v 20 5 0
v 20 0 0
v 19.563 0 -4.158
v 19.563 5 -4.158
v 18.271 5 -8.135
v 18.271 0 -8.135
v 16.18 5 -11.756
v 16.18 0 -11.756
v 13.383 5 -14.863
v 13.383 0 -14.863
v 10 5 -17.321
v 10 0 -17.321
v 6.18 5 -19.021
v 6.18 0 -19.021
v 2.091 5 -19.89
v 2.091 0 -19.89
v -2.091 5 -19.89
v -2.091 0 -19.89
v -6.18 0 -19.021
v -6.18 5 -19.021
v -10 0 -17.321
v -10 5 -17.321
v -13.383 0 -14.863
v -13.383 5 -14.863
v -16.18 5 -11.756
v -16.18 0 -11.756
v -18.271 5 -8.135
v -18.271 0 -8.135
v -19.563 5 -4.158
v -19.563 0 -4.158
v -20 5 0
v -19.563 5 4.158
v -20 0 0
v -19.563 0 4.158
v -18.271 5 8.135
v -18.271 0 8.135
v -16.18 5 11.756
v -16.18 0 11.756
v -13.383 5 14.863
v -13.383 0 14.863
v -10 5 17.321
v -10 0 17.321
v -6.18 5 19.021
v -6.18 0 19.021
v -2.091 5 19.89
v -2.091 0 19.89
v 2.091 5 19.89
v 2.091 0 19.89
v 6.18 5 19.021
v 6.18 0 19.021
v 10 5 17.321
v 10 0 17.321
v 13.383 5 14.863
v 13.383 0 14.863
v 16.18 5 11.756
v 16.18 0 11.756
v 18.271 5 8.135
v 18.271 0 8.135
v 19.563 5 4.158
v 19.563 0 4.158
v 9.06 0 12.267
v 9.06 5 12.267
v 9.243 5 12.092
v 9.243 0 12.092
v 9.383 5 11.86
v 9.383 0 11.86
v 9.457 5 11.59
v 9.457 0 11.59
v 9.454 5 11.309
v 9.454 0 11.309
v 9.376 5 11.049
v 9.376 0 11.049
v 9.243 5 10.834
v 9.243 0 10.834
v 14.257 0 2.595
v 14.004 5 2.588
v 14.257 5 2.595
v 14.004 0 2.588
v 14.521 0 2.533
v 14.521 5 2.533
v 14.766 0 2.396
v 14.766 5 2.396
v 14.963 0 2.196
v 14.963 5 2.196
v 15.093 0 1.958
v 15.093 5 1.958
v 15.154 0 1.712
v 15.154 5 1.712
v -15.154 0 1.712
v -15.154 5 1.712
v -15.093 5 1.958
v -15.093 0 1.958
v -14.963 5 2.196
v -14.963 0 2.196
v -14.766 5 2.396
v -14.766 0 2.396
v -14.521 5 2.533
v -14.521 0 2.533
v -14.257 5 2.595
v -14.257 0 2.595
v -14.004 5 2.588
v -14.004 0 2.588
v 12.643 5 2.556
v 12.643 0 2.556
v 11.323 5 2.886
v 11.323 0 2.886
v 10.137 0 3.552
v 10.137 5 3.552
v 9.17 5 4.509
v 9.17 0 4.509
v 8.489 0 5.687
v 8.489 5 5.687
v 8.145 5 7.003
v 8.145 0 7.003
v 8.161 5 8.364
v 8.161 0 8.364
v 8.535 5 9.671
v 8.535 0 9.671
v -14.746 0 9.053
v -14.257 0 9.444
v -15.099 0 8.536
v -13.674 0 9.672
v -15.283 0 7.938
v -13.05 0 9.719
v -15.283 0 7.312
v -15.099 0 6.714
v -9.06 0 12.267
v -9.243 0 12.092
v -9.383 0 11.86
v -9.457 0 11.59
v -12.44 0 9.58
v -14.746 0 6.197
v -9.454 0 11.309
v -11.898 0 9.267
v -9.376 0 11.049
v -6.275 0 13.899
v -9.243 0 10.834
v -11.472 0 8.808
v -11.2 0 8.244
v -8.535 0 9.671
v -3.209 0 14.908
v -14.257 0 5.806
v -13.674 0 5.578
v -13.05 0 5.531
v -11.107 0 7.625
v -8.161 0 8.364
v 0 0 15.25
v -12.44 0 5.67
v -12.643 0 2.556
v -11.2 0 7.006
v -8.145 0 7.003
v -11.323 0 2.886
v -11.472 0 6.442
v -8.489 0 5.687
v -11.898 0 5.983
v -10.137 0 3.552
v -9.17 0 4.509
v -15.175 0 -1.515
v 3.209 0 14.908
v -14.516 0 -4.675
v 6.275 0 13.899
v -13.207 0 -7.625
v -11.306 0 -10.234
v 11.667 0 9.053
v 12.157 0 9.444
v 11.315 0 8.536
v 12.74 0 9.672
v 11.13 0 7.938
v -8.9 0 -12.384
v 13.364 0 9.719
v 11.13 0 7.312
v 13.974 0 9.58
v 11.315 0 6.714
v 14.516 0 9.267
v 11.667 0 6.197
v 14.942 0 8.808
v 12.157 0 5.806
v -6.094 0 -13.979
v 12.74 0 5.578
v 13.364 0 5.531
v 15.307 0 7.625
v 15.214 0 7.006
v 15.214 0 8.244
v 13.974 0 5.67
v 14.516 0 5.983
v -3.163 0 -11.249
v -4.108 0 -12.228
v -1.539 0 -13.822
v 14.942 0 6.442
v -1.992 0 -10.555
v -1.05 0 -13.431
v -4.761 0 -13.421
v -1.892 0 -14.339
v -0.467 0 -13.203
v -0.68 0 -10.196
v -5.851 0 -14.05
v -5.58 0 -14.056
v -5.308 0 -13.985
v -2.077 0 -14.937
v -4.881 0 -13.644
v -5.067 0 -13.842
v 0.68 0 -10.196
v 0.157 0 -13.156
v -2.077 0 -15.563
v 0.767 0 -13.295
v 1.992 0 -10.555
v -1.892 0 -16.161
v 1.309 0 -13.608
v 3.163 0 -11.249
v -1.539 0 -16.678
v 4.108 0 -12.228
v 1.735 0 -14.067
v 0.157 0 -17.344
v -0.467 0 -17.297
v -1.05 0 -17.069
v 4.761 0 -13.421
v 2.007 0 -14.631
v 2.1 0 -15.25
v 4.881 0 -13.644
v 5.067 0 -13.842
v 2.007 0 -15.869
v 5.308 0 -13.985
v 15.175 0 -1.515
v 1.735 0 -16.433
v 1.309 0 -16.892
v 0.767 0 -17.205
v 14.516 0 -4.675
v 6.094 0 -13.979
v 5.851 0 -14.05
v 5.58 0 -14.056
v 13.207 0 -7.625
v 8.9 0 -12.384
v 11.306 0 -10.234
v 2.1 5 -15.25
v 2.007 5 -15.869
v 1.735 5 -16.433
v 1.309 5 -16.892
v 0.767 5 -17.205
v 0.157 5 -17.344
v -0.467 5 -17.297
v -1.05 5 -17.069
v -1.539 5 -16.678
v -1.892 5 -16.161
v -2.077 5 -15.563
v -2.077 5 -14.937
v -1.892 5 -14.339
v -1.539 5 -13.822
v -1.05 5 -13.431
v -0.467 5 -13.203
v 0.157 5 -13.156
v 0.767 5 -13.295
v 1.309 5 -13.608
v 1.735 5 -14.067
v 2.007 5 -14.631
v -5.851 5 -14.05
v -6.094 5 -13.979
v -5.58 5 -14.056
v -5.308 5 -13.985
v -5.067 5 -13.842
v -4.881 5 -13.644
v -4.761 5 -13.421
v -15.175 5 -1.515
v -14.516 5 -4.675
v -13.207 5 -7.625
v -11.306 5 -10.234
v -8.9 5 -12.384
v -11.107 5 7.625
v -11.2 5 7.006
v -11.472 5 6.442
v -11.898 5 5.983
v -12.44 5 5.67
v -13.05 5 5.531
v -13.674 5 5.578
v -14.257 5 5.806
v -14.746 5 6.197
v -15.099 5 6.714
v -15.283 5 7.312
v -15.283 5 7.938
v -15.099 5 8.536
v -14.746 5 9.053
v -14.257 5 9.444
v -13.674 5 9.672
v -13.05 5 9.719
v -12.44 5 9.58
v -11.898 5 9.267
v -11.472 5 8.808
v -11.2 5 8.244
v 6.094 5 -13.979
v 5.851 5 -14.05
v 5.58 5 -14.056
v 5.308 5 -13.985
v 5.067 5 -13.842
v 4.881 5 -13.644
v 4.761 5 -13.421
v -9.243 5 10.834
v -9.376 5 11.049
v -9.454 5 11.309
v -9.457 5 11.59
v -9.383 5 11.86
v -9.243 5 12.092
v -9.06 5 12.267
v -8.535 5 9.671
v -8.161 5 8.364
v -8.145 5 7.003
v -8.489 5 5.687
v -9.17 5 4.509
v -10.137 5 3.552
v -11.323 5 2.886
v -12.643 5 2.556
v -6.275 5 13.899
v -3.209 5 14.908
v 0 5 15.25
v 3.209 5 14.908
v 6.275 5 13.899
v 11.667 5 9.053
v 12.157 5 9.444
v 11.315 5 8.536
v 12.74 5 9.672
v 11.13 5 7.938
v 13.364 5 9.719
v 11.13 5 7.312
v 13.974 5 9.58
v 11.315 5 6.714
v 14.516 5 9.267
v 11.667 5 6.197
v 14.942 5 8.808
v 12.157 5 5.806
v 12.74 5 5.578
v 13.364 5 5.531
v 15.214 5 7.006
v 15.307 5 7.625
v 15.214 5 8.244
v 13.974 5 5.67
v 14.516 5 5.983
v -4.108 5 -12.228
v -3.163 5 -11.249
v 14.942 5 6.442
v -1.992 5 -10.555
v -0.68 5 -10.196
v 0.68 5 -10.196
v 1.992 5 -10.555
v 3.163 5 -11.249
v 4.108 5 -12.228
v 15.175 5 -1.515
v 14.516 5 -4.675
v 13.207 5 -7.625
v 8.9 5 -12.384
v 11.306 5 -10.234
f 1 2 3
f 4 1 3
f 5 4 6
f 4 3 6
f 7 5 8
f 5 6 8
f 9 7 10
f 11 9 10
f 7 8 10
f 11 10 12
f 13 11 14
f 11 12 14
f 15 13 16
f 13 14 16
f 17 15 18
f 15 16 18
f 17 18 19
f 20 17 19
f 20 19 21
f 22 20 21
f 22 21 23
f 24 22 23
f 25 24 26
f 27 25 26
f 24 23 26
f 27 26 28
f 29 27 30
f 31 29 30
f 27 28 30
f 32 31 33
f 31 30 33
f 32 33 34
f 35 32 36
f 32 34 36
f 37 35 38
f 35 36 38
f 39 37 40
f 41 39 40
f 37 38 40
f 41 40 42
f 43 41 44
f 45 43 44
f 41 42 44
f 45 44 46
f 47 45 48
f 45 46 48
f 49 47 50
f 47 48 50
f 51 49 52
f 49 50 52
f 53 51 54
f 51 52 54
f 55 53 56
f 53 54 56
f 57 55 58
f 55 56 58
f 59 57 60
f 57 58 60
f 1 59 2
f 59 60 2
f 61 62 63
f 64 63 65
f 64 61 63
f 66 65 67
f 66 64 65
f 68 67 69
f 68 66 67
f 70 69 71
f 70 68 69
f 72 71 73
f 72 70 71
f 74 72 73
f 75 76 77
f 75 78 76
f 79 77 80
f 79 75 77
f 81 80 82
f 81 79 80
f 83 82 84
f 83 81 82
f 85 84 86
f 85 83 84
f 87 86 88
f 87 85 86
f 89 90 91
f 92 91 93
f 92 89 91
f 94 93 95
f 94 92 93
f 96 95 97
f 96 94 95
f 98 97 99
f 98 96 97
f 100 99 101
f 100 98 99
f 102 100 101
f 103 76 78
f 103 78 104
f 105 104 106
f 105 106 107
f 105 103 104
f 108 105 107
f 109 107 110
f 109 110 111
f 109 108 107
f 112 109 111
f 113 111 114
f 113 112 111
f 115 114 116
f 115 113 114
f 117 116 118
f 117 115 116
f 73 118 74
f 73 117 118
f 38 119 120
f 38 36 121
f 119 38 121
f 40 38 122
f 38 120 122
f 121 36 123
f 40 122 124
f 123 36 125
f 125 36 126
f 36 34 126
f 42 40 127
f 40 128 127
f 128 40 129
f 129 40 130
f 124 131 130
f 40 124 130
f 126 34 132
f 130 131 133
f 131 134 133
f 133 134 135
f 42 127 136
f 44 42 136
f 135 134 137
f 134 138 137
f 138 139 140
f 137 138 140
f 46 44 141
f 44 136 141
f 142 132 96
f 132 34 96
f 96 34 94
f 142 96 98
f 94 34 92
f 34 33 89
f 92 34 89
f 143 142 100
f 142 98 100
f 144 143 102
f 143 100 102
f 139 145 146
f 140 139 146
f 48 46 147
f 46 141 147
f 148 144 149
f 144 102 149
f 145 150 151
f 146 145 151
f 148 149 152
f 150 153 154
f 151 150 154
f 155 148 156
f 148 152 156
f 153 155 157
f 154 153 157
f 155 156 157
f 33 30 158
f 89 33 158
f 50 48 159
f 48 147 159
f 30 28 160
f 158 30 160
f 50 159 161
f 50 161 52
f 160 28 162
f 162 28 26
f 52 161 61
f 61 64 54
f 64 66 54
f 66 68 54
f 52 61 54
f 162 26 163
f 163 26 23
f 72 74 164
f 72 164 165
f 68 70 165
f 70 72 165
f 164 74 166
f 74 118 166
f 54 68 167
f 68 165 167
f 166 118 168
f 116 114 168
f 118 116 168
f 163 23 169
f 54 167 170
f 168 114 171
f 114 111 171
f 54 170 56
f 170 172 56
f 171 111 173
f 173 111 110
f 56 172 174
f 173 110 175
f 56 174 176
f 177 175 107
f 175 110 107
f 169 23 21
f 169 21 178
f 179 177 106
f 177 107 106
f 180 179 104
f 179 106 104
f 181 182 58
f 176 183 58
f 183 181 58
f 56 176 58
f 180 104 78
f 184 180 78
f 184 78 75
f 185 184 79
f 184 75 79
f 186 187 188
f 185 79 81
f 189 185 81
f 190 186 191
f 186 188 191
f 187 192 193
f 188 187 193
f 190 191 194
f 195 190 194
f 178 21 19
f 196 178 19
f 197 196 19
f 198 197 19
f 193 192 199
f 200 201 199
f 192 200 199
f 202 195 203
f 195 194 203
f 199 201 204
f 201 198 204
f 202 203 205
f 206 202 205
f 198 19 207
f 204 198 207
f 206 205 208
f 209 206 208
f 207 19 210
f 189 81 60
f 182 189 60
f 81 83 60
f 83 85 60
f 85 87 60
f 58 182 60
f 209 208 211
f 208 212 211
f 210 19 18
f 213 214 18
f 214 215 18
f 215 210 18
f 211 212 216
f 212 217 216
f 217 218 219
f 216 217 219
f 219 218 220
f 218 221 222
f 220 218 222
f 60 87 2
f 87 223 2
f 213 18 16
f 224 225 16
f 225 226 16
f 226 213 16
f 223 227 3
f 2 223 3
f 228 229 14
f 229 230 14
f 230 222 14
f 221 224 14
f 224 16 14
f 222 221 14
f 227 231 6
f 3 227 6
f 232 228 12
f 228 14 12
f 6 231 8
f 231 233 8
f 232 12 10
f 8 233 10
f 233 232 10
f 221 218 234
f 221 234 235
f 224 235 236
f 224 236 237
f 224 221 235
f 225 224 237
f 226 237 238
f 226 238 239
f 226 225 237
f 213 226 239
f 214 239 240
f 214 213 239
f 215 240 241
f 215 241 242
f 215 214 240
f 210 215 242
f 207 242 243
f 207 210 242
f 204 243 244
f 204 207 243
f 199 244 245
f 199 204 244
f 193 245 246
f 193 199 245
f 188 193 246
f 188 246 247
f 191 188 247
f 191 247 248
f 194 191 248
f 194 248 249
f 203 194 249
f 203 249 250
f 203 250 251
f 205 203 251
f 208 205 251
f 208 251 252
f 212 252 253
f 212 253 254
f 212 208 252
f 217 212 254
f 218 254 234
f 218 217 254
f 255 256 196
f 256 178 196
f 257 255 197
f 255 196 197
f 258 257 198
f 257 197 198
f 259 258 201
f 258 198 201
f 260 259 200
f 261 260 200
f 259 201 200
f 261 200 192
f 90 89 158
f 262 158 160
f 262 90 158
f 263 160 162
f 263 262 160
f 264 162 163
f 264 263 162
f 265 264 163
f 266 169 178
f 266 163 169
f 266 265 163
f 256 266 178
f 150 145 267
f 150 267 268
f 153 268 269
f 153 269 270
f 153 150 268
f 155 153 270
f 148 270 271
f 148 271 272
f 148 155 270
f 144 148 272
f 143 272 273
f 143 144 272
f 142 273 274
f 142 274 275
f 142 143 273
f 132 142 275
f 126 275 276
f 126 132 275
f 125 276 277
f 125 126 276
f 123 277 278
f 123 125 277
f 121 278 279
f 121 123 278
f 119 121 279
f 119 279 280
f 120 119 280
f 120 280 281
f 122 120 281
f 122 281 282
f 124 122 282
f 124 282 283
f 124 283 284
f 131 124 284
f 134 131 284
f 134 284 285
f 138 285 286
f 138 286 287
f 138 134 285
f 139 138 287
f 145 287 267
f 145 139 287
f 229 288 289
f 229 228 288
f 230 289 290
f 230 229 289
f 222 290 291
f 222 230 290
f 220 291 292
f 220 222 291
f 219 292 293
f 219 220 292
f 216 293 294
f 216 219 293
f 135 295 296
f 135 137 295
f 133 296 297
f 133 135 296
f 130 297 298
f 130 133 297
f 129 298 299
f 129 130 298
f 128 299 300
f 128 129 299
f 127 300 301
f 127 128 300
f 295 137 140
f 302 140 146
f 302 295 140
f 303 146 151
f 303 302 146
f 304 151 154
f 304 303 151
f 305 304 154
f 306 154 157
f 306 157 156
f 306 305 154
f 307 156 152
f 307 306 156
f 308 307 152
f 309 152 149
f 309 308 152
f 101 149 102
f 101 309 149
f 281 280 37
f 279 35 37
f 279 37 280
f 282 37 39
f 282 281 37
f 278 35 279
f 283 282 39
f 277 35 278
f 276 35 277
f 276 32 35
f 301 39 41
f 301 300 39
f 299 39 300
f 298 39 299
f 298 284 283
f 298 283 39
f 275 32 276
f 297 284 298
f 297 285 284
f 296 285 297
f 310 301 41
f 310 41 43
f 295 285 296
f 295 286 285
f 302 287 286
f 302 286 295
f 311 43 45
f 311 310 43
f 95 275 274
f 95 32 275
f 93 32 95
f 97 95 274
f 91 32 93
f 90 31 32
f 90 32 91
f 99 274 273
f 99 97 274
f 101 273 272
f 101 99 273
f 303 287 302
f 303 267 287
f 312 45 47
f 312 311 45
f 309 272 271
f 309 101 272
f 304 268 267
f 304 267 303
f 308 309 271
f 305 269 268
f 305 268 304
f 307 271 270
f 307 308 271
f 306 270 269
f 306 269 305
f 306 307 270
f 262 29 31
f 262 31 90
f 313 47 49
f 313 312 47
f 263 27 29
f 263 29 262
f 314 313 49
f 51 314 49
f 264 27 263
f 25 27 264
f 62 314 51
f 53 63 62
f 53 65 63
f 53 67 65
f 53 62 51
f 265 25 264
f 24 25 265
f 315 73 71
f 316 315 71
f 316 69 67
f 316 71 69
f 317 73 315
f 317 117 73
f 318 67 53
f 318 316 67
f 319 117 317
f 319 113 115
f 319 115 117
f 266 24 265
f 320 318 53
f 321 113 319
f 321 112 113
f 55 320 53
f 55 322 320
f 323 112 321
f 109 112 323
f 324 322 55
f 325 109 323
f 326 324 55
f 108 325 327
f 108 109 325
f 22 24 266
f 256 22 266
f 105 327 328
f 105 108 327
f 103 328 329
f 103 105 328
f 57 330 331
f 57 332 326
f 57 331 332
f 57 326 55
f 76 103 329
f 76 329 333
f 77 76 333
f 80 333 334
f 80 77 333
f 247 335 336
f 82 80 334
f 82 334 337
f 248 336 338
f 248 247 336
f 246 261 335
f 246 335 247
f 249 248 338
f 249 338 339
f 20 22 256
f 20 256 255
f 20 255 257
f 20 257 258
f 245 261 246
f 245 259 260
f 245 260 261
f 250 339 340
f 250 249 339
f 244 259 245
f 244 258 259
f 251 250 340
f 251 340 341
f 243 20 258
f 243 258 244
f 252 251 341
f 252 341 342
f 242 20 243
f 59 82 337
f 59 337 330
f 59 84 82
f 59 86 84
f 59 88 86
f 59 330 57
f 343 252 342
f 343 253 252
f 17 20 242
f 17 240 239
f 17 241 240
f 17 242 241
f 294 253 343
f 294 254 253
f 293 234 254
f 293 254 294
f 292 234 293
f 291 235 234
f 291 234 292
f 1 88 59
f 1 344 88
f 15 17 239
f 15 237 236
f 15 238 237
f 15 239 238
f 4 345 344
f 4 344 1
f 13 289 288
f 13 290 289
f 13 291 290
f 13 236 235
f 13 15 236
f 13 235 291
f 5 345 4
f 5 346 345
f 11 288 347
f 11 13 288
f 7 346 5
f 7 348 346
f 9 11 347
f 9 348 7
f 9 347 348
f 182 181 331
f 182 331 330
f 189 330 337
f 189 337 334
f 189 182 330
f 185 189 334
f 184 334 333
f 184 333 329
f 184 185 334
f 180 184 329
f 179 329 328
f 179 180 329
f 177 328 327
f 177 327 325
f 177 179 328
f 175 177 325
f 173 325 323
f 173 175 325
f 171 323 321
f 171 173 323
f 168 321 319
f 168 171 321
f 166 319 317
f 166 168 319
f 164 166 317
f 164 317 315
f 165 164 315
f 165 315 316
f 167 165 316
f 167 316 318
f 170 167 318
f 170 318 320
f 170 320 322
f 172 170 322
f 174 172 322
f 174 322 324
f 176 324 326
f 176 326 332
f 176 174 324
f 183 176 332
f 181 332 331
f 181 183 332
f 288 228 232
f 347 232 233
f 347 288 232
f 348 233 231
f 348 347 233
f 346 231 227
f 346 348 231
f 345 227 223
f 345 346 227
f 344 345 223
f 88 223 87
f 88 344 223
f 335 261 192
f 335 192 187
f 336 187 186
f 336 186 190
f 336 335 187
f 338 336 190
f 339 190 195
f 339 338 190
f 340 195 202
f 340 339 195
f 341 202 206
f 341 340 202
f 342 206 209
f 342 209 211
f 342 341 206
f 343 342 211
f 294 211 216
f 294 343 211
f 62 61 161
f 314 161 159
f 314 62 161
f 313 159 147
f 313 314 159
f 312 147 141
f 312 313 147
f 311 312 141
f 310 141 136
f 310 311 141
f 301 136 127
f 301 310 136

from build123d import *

# Parameters (mm, degrees)
SKETCH1_R           = 20
SKETCH1_R_2         = 10
SKETCH1_R_3         = 2.1
BOSS_EXTRUDE1_DEPTH = 5
CUT_EXTRUDE1_DEPTH  = 6
FILLET1_R           = 1


with BuildPart() as part:
    # Sketch1 → Boss-Extrude1 (new body)
    with BuildSketch(Plane(origin=(0, 0, 0), x_dir=(1, 0, 0), z_dir=(0, 1, 0))):
        Circle(SKETCH1_R)
        Circle(SKETCH1_R_2, mode=Mode.SUBTRACT)
        with Locations((0, 15.25)):
            Circle(SKETCH1_R_3, mode=Mode.SUBTRACT)
        with Locations((13.206887408, -7.625)):
            Circle(SKETCH1_R_3, mode=Mode.SUBTRACT)
        with Locations((-13.206887408, -7.625)):
            Circle(SKETCH1_R_3, mode=Mode.SUBTRACT)
    extrude(amount=BOSS_EXTRUDE1_DEPTH)

    # Sketch2 → Cut-Extrude1 (cut, through all)
    with BuildSketch(Plane(origin=(0, 5, 0), x_dir=(1, 0, 0), z_dir=(0, 1, 0))):
        with BuildLine():
            ThreePointArc((-5.028195952, 14.397213115), (0, 10.15), (5.028195952, 14.397213115))
            ThreePointArc((5.028195952, 14.397213115), (13.206887408, 7.625), (14.982450277, -2.844061128))
            ThreePointArc((14.982450277, -2.844061128), (8.790157848, -5.075), (9.954254325, -11.553151987))
            ThreePointArc((9.954254325, -11.553151987), (0, -15.25), (-9.954254325, -11.553151987))
            ThreePointArc((-9.954254325, -11.553151987), (-8.790157848, -5.075), (-14.982450277, -2.844061128))
            ThreePointArc((-14.982450277, -2.844061128), (-13.206887408, 7.625), (-5.028195952, 14.397213115))
        make_face()
    extrude(amount=-CUT_EXTRUDE1_DEPTH, mode=Mode.SUBTRACT)

    # Fillet1
    fillet1_edges = [part.edges().sort_by_distance(p)[0] for p in [
        (-14.982450277, 2.5, 2.844061128),
        (-5.028195952, 2.5, -14.397213115),
        (5.028195952, 2.5, -14.397213115),
        (14.982450277, 2.5, 2.844061128),
        (9.954254325, 2.5, 11.553151987),
        (-9.954254325, 2.5, 11.553151987),
    ]]
    fillet(fillet1_edges, radius=FILLET1_R)


solid = part.part
